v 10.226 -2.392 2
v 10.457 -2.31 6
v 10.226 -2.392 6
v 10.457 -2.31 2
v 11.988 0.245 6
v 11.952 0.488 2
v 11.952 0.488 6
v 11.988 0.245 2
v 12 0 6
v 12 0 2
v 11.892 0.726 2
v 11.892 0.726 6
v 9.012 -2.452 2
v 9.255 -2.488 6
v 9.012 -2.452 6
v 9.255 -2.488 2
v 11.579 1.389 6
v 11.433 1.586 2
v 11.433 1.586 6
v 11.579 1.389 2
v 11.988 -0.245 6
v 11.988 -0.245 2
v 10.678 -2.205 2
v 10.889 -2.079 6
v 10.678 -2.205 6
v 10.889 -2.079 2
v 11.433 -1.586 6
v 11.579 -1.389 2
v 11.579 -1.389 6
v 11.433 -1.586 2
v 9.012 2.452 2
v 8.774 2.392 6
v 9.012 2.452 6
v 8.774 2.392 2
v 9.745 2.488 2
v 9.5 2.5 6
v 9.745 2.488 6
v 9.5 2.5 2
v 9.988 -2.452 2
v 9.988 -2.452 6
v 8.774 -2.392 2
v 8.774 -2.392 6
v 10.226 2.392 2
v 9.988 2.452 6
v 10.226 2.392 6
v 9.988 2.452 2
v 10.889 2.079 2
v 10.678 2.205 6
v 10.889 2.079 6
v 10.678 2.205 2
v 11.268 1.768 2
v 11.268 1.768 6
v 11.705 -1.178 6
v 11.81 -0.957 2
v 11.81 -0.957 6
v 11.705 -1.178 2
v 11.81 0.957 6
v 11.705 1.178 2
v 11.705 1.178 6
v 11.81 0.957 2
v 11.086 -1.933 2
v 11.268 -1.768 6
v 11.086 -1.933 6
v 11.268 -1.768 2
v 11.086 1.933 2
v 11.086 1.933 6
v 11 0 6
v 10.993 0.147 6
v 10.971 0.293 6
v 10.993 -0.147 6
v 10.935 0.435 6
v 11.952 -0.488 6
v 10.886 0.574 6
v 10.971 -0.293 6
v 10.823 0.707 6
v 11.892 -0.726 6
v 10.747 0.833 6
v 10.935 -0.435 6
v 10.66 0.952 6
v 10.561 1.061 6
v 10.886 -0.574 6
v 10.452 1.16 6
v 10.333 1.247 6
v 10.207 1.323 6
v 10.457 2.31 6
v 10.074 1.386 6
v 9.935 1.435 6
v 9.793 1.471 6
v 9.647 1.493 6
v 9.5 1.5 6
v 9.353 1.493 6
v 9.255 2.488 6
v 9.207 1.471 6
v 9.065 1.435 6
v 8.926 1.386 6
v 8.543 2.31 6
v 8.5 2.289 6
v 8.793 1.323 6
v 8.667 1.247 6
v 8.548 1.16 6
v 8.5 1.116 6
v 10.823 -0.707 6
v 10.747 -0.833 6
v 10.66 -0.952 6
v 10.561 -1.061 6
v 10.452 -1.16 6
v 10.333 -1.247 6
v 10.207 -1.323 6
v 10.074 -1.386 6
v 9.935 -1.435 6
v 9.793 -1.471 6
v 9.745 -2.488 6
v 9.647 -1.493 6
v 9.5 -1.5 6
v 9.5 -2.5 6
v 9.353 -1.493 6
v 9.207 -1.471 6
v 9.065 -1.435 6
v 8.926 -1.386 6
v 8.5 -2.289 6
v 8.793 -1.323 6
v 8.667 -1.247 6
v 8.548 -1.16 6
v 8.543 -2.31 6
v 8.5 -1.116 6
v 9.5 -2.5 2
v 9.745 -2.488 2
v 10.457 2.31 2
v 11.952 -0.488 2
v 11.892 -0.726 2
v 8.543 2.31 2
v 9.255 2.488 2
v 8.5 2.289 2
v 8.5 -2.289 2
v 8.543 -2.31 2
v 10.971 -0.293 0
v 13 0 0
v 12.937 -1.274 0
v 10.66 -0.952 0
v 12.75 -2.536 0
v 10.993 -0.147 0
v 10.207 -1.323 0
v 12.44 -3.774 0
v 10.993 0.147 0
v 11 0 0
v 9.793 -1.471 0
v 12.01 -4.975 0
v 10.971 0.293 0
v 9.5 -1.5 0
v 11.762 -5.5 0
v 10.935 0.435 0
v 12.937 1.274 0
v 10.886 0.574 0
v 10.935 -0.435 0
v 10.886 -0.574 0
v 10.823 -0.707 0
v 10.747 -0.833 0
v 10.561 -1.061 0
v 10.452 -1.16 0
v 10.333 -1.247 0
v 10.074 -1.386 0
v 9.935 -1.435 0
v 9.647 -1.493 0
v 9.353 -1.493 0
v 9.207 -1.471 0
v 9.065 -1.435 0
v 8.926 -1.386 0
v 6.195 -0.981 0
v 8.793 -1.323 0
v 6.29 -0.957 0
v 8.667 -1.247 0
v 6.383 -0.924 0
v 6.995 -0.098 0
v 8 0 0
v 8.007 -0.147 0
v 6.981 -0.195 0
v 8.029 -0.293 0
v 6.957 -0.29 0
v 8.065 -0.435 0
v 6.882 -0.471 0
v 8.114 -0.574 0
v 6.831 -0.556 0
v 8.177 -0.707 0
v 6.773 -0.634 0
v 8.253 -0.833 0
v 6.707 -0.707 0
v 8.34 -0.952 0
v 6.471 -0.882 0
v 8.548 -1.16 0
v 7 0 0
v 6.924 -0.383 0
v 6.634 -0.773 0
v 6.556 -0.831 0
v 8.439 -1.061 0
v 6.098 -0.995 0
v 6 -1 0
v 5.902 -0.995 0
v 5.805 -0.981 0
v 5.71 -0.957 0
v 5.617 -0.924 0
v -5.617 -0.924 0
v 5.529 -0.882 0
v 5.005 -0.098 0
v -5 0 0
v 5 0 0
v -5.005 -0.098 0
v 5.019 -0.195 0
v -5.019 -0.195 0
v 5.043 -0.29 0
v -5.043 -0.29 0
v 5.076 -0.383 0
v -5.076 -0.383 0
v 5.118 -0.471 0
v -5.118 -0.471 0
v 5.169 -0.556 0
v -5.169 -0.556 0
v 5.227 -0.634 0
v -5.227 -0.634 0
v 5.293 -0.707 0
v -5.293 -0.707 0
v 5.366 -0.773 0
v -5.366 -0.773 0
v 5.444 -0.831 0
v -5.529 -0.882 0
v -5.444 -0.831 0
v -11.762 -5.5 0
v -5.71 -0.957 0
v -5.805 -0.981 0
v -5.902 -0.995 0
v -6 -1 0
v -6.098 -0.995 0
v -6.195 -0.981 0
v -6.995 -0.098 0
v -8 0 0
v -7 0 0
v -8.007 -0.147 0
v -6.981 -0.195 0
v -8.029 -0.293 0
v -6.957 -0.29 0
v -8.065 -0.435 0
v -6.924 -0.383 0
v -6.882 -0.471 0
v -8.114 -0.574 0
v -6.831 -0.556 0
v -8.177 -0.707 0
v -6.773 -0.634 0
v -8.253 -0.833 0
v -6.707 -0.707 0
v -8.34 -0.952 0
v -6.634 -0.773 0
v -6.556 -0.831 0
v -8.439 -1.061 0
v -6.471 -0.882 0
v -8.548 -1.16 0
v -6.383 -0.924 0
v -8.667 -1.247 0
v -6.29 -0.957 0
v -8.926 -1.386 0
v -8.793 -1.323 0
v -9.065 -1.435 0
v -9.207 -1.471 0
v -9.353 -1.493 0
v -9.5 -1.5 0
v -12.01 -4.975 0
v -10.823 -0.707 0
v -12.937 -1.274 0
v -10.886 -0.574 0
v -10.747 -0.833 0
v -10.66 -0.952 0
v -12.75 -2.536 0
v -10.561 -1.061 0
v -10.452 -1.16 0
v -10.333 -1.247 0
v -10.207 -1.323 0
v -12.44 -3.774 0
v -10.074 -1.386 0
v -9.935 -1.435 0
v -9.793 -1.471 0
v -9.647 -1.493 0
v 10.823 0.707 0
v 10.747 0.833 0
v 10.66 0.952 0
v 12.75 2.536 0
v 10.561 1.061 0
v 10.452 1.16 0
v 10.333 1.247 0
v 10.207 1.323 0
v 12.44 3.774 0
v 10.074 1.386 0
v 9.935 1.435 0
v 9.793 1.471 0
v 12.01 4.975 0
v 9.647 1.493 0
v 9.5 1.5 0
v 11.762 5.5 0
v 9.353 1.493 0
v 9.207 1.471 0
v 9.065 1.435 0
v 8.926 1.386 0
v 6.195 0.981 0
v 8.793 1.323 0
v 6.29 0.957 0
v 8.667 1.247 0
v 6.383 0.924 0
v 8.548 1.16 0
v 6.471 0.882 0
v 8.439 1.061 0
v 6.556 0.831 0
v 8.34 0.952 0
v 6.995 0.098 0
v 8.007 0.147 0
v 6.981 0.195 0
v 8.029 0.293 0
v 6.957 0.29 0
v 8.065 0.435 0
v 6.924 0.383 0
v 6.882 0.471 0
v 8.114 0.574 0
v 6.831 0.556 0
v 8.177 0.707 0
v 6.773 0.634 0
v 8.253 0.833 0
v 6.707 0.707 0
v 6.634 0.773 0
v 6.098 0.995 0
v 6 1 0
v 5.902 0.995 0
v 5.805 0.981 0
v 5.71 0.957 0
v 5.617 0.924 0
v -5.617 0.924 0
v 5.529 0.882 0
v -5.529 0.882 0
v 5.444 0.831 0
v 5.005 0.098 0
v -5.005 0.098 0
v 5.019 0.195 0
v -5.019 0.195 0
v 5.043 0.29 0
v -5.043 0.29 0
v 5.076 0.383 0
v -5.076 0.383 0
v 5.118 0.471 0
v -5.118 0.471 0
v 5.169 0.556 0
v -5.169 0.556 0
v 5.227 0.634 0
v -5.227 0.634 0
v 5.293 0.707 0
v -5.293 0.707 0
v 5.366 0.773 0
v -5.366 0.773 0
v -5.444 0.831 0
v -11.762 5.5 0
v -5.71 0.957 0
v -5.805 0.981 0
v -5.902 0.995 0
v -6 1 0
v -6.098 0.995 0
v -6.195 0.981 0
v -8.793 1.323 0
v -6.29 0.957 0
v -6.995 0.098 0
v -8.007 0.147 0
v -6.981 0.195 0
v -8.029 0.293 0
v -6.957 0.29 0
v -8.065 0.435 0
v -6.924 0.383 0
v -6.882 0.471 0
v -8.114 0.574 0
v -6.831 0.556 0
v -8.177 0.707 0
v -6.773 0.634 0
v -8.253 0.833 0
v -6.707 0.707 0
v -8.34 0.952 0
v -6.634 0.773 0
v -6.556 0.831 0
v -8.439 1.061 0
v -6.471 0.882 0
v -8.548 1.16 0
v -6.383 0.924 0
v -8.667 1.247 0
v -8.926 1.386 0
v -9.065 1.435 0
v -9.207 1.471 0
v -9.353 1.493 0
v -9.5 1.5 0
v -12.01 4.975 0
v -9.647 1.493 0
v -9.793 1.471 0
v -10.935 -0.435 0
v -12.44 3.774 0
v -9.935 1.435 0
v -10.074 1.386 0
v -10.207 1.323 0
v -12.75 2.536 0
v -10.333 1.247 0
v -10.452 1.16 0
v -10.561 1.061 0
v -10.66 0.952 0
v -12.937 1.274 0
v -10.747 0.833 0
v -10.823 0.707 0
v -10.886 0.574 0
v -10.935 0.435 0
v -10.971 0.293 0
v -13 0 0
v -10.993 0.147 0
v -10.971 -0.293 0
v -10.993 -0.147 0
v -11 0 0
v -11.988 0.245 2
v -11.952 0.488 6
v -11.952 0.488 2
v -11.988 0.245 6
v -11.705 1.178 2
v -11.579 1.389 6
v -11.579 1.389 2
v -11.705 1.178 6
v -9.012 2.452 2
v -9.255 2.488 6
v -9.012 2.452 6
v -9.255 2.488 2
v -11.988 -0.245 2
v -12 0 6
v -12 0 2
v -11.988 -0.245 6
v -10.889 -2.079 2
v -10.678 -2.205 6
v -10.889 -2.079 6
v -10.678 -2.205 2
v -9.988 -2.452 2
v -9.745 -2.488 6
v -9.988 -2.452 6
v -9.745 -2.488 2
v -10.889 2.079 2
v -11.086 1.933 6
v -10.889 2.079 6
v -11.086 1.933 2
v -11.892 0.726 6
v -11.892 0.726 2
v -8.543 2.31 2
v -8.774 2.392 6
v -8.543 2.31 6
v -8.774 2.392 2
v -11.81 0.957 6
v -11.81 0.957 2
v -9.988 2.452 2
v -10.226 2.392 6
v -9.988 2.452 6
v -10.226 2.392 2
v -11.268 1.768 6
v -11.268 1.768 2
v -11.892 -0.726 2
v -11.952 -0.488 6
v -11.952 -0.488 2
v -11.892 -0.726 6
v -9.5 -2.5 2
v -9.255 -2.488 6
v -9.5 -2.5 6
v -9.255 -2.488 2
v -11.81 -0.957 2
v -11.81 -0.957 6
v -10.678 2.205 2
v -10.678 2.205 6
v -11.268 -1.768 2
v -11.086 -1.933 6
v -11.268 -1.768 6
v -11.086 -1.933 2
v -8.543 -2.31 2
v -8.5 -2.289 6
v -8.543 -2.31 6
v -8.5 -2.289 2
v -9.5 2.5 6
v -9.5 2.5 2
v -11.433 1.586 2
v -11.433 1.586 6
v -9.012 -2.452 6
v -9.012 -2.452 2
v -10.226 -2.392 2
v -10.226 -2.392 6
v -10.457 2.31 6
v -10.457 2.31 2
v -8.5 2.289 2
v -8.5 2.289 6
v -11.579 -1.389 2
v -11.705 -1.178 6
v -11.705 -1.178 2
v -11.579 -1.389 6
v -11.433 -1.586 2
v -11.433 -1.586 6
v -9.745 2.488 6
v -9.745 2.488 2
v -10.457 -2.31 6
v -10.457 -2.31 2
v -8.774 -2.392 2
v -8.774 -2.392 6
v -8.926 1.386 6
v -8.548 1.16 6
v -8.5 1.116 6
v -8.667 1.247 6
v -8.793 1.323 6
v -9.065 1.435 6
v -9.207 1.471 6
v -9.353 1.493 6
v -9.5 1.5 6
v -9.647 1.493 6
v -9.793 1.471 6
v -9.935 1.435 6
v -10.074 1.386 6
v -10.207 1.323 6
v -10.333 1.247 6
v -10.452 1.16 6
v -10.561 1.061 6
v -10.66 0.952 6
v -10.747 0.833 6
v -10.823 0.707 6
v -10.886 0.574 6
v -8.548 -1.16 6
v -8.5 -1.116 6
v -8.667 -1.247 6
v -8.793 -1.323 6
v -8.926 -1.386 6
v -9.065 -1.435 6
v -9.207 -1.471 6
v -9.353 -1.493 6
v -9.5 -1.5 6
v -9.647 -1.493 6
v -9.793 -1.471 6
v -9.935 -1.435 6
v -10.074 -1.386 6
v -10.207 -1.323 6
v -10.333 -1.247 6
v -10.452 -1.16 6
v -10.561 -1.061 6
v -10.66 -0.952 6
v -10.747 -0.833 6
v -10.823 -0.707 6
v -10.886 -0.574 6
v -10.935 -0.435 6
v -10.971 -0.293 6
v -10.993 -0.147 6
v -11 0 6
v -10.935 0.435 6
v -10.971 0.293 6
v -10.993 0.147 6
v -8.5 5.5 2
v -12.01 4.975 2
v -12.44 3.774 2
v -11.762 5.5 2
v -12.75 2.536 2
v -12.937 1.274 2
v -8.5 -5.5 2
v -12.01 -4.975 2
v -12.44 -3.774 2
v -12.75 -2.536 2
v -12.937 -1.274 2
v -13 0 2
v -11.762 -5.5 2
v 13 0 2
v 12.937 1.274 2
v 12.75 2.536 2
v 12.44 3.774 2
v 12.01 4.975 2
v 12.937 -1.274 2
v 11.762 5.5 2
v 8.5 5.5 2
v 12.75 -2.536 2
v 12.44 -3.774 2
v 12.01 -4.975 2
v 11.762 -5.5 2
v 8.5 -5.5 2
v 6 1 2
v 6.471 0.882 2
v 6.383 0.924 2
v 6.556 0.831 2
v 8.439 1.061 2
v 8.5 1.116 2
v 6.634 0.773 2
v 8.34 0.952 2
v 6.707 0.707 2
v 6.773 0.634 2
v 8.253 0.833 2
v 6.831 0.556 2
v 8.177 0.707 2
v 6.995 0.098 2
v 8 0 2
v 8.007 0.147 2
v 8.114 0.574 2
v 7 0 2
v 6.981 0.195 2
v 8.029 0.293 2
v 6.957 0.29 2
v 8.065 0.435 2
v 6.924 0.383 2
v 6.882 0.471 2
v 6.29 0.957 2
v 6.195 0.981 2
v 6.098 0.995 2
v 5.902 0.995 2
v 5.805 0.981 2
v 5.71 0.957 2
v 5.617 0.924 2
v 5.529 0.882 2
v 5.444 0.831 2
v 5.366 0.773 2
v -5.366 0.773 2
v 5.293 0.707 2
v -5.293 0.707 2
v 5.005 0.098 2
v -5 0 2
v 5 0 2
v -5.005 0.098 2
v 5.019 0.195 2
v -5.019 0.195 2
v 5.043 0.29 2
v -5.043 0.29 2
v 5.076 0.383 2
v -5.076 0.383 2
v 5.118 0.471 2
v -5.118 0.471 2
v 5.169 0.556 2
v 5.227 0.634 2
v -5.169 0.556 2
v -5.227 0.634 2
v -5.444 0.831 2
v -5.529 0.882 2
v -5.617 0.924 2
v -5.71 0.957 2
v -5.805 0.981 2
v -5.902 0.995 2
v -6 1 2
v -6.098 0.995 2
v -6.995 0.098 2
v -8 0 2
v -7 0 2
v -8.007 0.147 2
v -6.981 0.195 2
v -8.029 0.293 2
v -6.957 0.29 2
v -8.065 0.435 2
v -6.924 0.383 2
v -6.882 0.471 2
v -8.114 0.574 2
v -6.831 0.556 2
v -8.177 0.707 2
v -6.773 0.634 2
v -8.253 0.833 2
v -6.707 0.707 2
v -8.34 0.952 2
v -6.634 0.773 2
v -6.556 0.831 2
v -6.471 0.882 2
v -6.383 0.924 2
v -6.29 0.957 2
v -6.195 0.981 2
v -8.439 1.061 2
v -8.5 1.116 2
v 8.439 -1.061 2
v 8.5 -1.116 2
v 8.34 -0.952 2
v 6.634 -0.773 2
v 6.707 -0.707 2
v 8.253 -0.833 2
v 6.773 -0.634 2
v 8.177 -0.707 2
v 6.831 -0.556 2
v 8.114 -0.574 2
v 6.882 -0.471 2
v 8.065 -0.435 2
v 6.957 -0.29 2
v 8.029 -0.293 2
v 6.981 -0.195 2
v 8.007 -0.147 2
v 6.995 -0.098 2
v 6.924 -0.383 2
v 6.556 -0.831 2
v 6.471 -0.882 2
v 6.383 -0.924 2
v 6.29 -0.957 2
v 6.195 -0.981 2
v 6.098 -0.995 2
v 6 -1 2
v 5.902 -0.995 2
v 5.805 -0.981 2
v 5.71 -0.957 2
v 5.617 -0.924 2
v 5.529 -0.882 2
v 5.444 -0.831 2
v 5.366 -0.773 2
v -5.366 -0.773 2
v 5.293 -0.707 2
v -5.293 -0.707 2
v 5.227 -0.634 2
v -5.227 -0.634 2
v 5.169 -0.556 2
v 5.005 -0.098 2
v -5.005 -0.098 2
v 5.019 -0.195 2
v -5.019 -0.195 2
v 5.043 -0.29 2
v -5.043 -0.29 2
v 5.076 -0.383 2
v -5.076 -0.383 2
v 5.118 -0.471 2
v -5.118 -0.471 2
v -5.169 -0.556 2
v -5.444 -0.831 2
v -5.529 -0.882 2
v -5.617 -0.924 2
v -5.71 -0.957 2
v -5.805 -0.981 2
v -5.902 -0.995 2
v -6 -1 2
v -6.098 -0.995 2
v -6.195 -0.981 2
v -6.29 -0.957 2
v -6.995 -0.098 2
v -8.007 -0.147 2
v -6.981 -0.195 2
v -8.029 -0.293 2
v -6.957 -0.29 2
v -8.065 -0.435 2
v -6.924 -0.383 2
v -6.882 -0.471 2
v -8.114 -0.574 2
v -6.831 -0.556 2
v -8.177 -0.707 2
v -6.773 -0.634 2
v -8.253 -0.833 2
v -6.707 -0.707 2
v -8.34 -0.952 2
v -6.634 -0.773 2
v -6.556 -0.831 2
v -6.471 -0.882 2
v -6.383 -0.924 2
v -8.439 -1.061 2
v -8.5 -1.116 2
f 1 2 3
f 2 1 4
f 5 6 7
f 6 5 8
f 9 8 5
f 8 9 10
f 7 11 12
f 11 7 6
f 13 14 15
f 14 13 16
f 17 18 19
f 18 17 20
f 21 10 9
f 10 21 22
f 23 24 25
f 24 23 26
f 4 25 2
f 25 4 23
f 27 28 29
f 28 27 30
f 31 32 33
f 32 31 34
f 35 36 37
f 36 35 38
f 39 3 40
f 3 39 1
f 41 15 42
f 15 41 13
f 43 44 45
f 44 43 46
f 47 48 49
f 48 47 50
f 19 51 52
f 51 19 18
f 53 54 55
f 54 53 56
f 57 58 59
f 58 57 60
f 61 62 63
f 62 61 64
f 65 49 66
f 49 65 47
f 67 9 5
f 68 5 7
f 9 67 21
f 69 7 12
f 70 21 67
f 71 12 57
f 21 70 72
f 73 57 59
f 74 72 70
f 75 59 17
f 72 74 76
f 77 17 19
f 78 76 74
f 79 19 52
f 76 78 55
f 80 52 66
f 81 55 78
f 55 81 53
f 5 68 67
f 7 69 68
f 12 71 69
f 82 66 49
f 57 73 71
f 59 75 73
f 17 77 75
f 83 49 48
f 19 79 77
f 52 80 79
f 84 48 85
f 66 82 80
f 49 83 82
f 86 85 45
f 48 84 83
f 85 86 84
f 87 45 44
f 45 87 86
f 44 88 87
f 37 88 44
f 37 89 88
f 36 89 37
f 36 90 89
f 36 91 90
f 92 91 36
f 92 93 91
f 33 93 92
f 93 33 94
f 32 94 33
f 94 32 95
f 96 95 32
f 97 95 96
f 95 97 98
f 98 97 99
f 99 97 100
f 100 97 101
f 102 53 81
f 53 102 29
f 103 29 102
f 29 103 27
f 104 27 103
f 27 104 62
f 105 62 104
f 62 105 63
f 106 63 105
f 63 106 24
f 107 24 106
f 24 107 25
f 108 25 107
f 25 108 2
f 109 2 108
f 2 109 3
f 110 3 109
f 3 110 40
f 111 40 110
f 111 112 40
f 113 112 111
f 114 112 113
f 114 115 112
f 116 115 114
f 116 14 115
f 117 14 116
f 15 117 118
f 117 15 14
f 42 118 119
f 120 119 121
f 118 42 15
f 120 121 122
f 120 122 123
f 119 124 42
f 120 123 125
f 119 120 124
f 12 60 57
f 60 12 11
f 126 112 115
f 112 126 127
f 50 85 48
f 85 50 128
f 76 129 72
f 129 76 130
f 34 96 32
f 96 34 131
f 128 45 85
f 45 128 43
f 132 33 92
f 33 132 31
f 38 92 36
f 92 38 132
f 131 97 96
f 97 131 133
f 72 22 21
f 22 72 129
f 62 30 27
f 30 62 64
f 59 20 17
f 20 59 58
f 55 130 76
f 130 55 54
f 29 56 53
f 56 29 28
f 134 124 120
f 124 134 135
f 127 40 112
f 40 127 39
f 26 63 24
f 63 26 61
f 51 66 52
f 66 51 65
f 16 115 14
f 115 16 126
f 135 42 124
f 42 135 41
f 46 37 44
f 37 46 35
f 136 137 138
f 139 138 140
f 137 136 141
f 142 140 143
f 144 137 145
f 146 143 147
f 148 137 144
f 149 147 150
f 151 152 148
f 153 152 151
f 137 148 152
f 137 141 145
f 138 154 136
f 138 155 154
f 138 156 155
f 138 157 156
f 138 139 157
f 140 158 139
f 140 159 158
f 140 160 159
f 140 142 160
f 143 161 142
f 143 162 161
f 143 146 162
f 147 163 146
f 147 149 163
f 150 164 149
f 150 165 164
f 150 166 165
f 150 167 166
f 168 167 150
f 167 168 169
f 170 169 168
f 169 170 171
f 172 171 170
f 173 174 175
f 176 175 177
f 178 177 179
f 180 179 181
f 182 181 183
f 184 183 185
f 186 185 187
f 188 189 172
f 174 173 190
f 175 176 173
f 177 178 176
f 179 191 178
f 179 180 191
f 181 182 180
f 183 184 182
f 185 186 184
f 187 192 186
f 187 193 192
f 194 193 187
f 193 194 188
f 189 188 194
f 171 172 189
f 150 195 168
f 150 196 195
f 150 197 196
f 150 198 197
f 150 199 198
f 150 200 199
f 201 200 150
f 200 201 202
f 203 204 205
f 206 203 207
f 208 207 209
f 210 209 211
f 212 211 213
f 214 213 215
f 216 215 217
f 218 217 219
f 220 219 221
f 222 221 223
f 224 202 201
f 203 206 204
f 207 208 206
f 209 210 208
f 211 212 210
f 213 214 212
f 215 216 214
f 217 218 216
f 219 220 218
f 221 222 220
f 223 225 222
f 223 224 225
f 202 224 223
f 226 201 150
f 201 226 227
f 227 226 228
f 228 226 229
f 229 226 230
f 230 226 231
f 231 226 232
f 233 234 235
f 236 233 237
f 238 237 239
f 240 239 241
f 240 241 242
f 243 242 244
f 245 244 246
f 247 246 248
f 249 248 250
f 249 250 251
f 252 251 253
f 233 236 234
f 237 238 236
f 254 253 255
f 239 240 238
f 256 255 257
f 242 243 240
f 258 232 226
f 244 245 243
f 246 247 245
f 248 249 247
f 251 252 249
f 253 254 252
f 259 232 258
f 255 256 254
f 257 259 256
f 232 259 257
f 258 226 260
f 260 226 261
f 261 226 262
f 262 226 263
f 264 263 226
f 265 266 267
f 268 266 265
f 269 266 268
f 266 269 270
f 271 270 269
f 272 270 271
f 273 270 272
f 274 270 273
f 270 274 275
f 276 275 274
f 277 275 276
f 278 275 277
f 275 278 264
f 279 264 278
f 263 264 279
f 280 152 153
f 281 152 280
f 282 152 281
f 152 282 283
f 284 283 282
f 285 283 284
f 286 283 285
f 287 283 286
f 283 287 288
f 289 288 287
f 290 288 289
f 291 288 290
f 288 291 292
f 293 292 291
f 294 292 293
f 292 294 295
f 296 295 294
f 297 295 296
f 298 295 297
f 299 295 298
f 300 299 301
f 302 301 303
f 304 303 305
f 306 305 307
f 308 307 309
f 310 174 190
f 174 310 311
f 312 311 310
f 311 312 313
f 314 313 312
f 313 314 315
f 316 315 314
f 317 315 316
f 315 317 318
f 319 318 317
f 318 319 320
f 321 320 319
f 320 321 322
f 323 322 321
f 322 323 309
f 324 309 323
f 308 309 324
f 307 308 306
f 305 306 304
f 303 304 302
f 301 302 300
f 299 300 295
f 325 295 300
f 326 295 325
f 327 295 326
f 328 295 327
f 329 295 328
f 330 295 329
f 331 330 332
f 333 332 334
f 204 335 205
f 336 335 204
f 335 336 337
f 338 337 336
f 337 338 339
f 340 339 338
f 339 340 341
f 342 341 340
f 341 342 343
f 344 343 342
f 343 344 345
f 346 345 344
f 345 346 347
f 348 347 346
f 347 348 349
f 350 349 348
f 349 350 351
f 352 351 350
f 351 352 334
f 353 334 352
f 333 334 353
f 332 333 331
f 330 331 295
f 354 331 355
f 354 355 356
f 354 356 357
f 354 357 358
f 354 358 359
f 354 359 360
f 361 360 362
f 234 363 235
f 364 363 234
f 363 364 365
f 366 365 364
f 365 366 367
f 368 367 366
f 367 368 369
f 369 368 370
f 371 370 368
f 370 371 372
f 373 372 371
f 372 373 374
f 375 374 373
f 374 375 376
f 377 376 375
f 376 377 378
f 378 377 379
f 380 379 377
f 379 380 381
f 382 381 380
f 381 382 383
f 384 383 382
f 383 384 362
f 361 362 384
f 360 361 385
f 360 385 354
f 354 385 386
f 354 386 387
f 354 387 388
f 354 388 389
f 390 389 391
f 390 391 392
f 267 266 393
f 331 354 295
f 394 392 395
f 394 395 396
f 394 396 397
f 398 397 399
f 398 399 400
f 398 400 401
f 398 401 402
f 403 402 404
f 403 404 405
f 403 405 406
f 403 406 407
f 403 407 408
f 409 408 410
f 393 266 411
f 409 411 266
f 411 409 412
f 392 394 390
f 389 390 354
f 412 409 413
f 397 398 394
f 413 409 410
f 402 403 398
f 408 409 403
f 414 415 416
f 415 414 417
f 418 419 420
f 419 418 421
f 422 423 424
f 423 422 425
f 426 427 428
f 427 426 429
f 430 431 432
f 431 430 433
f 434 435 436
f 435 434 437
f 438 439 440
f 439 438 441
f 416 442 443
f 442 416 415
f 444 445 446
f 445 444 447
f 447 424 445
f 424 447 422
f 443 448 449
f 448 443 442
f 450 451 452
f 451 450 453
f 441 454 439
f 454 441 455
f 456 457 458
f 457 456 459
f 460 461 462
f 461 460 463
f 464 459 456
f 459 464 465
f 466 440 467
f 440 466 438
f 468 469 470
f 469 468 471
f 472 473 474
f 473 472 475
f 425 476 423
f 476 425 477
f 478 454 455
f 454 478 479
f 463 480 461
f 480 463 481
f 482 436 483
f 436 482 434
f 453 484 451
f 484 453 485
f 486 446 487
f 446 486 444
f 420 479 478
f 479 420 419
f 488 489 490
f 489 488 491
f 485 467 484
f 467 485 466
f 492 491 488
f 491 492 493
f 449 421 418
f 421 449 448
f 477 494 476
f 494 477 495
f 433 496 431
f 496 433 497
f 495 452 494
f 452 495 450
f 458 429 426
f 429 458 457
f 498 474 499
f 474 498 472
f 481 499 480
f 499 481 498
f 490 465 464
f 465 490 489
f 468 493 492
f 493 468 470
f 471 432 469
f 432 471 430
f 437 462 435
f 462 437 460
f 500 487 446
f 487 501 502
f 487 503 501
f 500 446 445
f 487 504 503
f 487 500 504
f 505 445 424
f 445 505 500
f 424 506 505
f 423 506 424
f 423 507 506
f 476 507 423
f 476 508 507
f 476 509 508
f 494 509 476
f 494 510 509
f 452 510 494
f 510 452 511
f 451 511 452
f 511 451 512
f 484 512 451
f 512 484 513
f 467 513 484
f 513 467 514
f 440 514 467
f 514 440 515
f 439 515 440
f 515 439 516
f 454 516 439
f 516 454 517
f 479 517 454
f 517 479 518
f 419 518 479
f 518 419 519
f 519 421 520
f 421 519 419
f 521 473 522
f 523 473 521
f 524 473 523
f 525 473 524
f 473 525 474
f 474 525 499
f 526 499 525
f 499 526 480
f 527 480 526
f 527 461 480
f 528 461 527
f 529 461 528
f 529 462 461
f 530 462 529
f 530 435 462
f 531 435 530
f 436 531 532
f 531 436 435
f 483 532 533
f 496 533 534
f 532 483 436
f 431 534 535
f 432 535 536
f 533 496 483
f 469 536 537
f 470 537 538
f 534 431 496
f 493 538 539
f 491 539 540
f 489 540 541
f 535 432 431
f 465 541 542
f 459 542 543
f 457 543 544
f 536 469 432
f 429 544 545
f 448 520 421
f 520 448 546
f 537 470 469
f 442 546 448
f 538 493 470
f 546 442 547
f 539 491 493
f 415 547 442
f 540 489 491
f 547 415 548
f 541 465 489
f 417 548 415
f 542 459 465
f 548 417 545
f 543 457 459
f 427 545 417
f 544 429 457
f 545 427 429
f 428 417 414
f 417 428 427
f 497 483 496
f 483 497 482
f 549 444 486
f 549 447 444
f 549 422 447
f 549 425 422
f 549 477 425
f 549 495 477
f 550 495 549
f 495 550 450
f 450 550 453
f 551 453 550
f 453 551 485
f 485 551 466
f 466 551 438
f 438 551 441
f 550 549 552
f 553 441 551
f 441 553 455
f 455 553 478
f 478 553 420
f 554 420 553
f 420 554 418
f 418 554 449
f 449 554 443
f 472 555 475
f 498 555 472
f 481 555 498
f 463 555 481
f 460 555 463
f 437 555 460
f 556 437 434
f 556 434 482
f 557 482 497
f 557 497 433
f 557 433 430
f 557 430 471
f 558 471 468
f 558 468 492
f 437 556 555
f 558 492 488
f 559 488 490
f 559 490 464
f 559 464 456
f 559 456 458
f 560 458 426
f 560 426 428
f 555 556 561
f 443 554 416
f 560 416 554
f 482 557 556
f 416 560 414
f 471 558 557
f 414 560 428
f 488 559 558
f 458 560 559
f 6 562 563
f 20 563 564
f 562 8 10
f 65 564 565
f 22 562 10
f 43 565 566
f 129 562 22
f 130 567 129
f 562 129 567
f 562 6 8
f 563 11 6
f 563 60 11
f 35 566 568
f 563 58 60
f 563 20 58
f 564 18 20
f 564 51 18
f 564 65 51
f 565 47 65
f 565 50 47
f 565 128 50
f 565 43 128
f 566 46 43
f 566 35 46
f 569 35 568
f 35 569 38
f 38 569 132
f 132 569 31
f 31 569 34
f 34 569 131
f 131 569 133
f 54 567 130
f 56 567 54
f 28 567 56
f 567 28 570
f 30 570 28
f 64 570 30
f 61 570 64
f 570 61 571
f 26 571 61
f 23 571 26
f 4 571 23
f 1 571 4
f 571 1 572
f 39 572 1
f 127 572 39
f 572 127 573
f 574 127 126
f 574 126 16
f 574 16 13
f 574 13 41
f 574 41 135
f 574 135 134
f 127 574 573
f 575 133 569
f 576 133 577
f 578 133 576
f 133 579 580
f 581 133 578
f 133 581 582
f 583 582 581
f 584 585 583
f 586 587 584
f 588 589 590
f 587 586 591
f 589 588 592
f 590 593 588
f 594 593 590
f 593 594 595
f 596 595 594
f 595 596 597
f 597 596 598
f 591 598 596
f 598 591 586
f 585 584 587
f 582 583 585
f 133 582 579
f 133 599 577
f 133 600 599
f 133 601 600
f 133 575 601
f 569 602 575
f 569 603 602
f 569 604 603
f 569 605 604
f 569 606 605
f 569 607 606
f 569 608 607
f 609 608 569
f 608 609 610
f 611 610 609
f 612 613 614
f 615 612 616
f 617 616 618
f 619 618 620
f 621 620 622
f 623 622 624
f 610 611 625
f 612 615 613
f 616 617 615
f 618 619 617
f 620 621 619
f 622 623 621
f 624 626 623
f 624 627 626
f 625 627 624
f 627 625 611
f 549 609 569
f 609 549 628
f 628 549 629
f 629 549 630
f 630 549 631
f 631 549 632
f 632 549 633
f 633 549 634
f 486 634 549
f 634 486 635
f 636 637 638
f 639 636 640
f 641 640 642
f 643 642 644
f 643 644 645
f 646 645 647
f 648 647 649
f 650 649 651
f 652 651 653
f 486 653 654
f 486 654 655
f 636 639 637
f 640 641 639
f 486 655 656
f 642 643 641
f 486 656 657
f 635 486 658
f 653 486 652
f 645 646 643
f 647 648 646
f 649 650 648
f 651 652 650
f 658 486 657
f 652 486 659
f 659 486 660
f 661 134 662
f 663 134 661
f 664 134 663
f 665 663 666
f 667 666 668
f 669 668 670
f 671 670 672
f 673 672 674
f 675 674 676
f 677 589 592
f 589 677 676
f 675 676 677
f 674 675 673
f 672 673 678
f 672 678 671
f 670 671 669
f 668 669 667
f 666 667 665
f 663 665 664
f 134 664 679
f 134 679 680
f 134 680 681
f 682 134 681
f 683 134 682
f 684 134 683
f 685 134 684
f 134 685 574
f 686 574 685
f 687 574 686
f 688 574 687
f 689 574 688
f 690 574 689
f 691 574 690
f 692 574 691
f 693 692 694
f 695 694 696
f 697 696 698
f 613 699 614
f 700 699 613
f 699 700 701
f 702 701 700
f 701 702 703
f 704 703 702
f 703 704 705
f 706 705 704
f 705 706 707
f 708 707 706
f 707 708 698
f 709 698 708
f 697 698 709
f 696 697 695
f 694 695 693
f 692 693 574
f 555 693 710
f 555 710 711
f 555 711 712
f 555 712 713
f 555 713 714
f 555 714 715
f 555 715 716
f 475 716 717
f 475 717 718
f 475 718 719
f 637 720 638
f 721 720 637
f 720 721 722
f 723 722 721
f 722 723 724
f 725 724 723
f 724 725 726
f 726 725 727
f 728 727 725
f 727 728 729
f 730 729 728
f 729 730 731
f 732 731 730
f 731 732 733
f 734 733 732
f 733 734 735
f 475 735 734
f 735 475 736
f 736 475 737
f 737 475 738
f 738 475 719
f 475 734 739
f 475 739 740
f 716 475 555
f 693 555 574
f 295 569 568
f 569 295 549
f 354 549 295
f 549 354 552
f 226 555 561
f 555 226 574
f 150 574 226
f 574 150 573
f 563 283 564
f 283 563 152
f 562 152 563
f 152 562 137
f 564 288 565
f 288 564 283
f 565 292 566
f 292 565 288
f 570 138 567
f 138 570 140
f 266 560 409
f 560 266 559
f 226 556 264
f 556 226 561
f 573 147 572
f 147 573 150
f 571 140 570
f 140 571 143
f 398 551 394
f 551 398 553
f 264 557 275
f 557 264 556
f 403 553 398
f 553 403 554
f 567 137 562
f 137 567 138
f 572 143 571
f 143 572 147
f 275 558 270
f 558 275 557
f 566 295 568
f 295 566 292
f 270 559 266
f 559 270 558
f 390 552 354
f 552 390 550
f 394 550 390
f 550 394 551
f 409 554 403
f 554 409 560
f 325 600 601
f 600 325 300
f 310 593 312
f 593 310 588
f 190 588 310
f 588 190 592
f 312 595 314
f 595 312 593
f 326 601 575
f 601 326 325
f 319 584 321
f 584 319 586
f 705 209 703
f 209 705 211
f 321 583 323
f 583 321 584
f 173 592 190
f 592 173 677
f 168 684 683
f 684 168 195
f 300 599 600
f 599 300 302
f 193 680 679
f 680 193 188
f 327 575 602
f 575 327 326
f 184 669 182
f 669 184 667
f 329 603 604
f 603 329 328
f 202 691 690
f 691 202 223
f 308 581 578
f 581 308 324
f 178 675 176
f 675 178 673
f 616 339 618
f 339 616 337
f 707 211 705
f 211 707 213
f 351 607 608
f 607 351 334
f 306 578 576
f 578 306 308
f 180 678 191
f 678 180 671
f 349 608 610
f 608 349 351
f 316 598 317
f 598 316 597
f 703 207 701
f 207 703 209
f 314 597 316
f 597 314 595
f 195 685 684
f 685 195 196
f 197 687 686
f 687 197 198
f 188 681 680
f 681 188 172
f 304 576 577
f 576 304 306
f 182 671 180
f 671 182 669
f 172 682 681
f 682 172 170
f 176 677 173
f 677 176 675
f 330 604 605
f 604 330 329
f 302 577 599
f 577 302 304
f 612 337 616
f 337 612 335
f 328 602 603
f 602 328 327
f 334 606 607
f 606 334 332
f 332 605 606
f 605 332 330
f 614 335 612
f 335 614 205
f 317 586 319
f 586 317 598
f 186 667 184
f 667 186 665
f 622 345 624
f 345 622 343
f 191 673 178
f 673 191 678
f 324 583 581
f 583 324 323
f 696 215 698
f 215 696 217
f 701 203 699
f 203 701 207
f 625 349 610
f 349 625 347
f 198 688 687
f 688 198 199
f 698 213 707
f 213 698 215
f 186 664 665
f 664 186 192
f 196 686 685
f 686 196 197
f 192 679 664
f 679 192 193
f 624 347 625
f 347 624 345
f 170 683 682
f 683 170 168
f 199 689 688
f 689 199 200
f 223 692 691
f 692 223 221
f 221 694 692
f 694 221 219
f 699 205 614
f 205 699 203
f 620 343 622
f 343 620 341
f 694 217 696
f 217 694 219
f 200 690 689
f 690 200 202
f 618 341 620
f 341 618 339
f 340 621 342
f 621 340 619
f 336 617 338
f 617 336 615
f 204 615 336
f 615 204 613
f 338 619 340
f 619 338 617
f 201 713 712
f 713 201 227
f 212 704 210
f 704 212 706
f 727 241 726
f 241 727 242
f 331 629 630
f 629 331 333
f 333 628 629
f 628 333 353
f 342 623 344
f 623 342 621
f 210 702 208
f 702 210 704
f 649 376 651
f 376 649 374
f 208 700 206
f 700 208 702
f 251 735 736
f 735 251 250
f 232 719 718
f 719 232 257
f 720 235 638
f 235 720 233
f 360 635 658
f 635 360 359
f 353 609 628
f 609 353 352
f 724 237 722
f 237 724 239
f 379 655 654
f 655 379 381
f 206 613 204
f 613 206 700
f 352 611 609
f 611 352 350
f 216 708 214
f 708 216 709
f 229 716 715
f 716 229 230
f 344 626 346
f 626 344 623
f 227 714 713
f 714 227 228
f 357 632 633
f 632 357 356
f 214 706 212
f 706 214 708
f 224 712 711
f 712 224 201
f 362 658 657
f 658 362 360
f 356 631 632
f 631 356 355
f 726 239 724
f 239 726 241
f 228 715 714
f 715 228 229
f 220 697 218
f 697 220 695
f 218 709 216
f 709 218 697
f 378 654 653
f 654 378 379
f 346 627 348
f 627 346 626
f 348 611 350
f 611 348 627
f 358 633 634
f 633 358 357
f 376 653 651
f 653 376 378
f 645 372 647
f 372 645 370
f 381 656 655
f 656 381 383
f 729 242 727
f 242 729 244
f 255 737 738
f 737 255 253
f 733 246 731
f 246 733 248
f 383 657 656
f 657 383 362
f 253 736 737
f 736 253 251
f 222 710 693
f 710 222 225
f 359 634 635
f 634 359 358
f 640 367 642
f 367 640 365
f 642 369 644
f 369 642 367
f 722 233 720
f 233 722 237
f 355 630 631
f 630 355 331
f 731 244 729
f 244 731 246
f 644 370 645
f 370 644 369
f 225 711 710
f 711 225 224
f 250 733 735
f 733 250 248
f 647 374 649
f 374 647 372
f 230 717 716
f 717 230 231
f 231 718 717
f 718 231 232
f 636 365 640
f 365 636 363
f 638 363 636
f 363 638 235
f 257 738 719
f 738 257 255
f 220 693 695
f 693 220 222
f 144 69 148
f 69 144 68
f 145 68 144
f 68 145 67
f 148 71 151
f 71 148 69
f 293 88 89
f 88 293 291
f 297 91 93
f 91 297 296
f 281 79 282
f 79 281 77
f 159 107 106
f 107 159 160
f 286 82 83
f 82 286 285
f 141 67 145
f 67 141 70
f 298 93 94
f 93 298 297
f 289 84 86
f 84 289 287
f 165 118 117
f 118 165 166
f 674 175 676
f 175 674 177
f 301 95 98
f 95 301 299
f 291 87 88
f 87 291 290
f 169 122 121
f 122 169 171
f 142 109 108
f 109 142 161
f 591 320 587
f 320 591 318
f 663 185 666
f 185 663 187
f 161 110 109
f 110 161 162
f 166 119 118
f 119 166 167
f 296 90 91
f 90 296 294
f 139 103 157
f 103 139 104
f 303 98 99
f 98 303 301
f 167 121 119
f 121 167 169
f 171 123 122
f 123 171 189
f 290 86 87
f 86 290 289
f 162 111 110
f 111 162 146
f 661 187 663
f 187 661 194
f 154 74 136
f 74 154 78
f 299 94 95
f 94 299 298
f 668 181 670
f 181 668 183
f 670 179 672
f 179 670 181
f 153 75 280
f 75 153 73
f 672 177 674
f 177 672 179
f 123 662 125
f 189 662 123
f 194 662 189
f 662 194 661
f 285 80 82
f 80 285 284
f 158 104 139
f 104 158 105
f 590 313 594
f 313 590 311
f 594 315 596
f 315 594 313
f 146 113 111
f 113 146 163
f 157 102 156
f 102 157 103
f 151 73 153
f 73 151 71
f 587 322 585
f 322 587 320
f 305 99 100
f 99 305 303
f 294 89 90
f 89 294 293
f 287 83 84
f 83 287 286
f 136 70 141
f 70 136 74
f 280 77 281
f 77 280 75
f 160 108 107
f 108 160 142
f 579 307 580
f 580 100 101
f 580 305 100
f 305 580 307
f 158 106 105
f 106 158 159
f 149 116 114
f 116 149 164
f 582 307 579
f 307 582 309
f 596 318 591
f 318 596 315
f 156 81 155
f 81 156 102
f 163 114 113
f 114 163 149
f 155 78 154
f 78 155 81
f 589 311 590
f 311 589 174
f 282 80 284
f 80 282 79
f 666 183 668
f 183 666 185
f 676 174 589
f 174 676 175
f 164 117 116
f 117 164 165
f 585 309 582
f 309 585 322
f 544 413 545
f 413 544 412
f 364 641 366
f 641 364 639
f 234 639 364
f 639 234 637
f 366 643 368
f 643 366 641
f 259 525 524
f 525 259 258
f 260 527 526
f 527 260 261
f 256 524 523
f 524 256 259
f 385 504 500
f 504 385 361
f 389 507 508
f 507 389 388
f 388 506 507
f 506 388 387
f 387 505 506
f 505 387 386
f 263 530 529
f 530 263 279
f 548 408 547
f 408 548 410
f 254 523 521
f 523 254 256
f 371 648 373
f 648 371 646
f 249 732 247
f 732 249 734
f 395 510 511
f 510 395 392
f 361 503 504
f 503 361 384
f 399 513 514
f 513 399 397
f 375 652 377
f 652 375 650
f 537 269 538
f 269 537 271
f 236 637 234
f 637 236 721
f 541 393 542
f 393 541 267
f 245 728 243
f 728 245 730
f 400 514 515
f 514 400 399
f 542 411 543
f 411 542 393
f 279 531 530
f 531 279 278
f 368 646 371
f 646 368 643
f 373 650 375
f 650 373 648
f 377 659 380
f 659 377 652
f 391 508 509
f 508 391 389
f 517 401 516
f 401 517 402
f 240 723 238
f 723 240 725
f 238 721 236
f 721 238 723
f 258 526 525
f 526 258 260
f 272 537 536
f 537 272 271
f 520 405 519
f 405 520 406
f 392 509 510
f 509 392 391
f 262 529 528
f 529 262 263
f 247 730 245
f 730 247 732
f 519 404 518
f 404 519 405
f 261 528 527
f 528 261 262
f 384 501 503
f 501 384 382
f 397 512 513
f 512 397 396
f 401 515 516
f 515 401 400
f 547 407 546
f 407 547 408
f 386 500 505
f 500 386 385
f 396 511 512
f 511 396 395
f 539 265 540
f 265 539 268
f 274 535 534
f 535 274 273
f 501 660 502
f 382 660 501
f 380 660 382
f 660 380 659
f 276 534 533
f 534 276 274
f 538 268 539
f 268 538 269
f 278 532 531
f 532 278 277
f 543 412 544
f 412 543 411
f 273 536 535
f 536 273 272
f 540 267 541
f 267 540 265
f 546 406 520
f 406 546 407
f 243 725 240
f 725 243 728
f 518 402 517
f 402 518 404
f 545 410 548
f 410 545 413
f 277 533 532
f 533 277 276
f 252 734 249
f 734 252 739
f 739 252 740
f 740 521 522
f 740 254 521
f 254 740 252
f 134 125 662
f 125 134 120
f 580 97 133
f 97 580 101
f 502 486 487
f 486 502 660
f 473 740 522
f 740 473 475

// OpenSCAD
$fn = 64;

MAGNET_H = 3;
SENSOR_H = 2;
MAGNET_SENSOR_H = MAGNET_H + SENSOR_H;

MAGNET_D_OUT = 10;
MAGNET_D_IN = 7;

MOTOR_D_OUT = 35;
MOTOR_D_IN = 5;
MOTOR_SHAFT_D = 4;


MOTOR_H = 15;

MOTOR_FIX_HOLE_D = 3;

MOTOR_BASE_HOLE_D = 12;

MOTOR_BASE_D1 = 16;
MOTOR_BASE_D2 = 19;

MOTOR_TOP_D1 = 16;
MOTOR_TOP_D2 = 16;

MOTOR_TOP_H = 10;

DRIVER_SIDE = 20;
DRIVER_CORNER_HOLE_D = 2;

DRIVER_PILLAR_D = 5;
DRIVER_PILLAR_FIX_H = 2;
DRIVER_INNER_FIX_L = 8;
DRIVER_INNER_FIX_W = 1;

BASE_H = 3;

BASE_W = 20;
BASE_L = 50;

BASE_FOOT_W = 50;
BASE_FOOT_L = 20;
BASE_FOOT_HOLE_W = 40;
BASE_FOOT_HOLE_WL = 10;
BASE_FOOT_HOLE_D = 2;
BASE_FOOT_HOLE_HEAD_D = 4;

BASE_LEG_W = 8;
BASE_LEG_L = 50;

module driver_pillar() {
    translate([0, 0, MAGNET_SENSOR_H/2])
    union() {
        difference() {
            translate([0, 0, DRIVER_PILLAR_FIX_H/2]) cylinder(r=DRIVER_PILLAR_D/2, h=MAGNET_SENSOR_H + DRIVER_PILLAR_FIX_H, center=true);
            translate([DRIVER_PILLAR_D/2, DRIVER_PILLAR_D/2, 0]) cube([DRIVER_PILLAR_D, DRIVER_PILLAR_D, MAGNET_SENSOR_H*2], center=true);
        }
        translate([0, 0, -MAGNET_SENSOR_H/4]) cylinder(r=DRIVER_PILLAR_D/2, h=MAGNET_SENSOR_H/2, center=true);
        rotate([0, 0, 45]) cube([DRIVER_INNER_FIX_L, DRIVER_INNER_FIX_W, MAGNET_SENSOR_H], center=true);
    }

}

module driver_pillar_hole() {
    translate([0, 0, MAGNET_SENSOR_H/2])
    cylinder(r=DRIVER_CORNER_HOLE_D/2, h=MAGNET_SENSOR_H*2, center=true);    
}

module driver_corner_fix() {
    difference() {
        driver_pillar();
        driver_pillar_hole();
    }
}

module driver_corners() {
    translate([+DRIVER_SIDE/2, +DRIVER_SIDE/2, 0]) rotate([0, 0, 180]) driver_corner_fix();
    translate([+DRIVER_SIDE/2, -DRIVER_SIDE/2, 0]) rotate([0, 0, 90]) driver_corner_fix();
    translate([-DRIVER_SIDE/2, +DRIVER_SIDE/2, 0]) rotate([0, 0, -90]) driver_corner_fix();
    translate([-DRIVER_SIDE/2, -DRIVER_SIDE/2, 0]) rotate([0, 0, 0]) driver_corner_fix();
}

AS5048A_BASE_W = 26;
AS5048A_BASE_L = 11;
AS5048A_BASE_H = 2;
AS5048A_H = 2.5;
MAGNET_H = 4;

AS5048A_HOLE_D = 2;
AS5048A_SUPP_D = MOTOR_FIX_HOLE_D + 2;
AS5048A_SUPP_H = AS5048A_H + MAGNET_H + AS5048A_BASE_H + 0.5 - BASE_H;
AS5048A_SUPP_W = 12;

AS5048A_CLEAR_W = AS5048A_SUPP_W + 5;

module as5048a_support_holes() {
    union() {
        translate([+AS5048A_SUPP_W/2, 0, 0]) cylinder(r=AS5048A_HOLE_D/2, h=50, center=true);
        translate([-AS5048A_SUPP_W/2, 0, 0]) cylinder(r=AS5048A_HOLE_D/2, h=50, center=true);
        translate([+MOTOR_BASE_D2/2, 0, 0]) cylinder(r=MOTOR_FIX_HOLE_D/2, h=50, center=true);
        translate([-MOTOR_BASE_D2/2, 0, 0]) cylinder(r=MOTOR_FIX_HOLE_D/2, h=50, center=true);
    }
}

module as5048a_support_pillars() {
    union() {
        translate([+MOTOR_BASE_D2/2, 0, AS5048A_SUPP_H/2]) cylinder(r=AS5048A_SUPP_D/2, h=AS5048A_SUPP_H, center=true);
        translate([-MOTOR_BASE_D2/2, 0, AS5048A_SUPP_H/2]) cylinder(r=AS5048A_SUPP_D/2, h=AS5048A_SUPP_H, center=true);
    }
}

module as5048a_support() {
    difference() {
        union() {
            as5048a_support_pillars();
            translate([0, 0, AS5048A_BASE_H/2]) {
                intersection() {
                    cube([AS5048A_BASE_W, AS5048A_BASE_L, AS5048A_BASE_H], center=true);
                    cylinder(r=AS5048A_BASE_W/2, h=AS5048A_BASE_H, center=true);
                }
            }
        }
        union() {
            as5048a_support_holes();
            translate([0, 0, AS5048A_BASE_H + 25]) {
                cube([AS5048A_CLEAR_W, AS5048A_CLEAR_W, 50], center=true);
            }
        }
    }
}

module base_plate() {
    difference() {
        union() {
            translate([0, 0, BASE_H/2]) {
                cylinder(r=MOTOR_D_OUT/2, h=BASE_H, center=true);
                cube([BASE_W, BASE_L, BASE_H], center=true);
            }
        }
        union() {
            cylinder(r=MOTOR_BASE_HOLE_D/2, h=50, center=true);
            translate([+MOTOR_BASE_D2/2, 0, 0]) cylinder(r=MOTOR_FIX_HOLE_D/2, h=50, center=true);
            translate([-MOTOR_BASE_D2/2, 0, 0]) cylinder(r=MOTOR_FIX_HOLE_D/2, h=50, center=true);
            translate([0, +MOTOR_BASE_D1/2, 0]) cylinder(r=MOTOR_FIX_HOLE_D/2, h=50, center=true);
            translate([0, -MOTOR_BASE_D1/2, 0]) cylinder(r=MOTOR_FIX_HOLE_D/2, h=50, center=true);
        }
    }
}

module base_foot() {
    translate([0, -(BASE_L + BASE_H) / 2, BASE_FOOT_L/2])
    rotate([-90, 0, 0])
    difference() {
        union() {
            cube([BASE_FOOT_W, BASE_FOOT_L, BASE_H], center=true);
            translate([-(BASE_H - BASE_W) / 2, (BASE_FOOT_L / 4) - BASE_H, (BASE_H / 2) + (BASE_FOOT_L / 4)]) cube([BASE_H, BASE_FOOT_L / 2, BASE_FOOT_L / 2], center=true);
            translate([+(BASE_H - BASE_W) / 2, (BASE_FOOT_L / 4) - BASE_H, (BASE_H / 2) + (BASE_FOOT_L / 4)]) cube([BASE_H, BASE_FOOT_L / 2, BASE_FOOT_L / 2], center=true);
        }
        union() {
            translate([+BASE_FOOT_HOLE_W/2, +BASE_FOOT_HOLE_WL/2, 0]) cylinder(r=BASE_FOOT_HOLE_D/2, h=50, center=true);
            translate([-BASE_FOOT_HOLE_W/2, +BASE_FOOT_HOLE_WL/2, 0]) cylinder(r=BASE_FOOT_HOLE_D/2, h=50, center=true);
            translate([+BASE_FOOT_HOLE_W/2, -BASE_FOOT_HOLE_WL/2, 0]) cylinder(r=BASE_FOOT_HOLE_D/2, h=50, center=true);
            translate([-BASE_FOOT_HOLE_W/2, -BASE_FOOT_HOLE_WL/2, 0]) cylinder(r=BASE_FOOT_HOLE_D/2, h=50, center=true);
            translate([0, -BASE_H, (BASE_H + BASE_FOOT_L) / 2]) rotate([0, 90, 0]) cylinder(r=BASE_FOOT_L/2, h=50, center=true);
        }
    }
}

module base_mosquito() {
    driver_corners();
    base_plate();
    base_foot();
}

module base_as5048a() {
    base_plate();
    base_foot();
}

module base_leg() {
    difference() {
        union() {
            cube([BASE_LEG_W, BASE_LEG_L, BASE_H], center=true);
        }
        translate([0, -10, 0])
        union() {
            translate([0, +BASE_FOOT_HOLE_WL/2, 0]) cylinder(r=BASE_FOOT_HOLE_D/2, h=50, center=true);
            translate([0, -BASE_FOOT_HOLE_WL/2, 0]) cylinder(r=BASE_FOOT_HOLE_D/2, h=50, center=true);
            translate([0, +BASE_FOOT_HOLE_WL/2, 25]) cylinder(r=BASE_FOOT_HOLE_HEAD_D/2, h=50, center=true);
            translate([0, -BASE_FOOT_HOLE_WL/2, 25]) cylinder(r=BASE_FOOT_HOLE_HEAD_D/2, h=50, center=true);
        }
    }
}


module shaft_fix() {
    difference() {
        union() {
            translate([0, 0, MAGNET_H/2]) cylinder(r=MAGNET_D_IN/2, h=MAGNET_H, center=true);
            translate([0, 0, (MOTOR_H/2) + MAGNET_H]) cylinder(r=MOTOR_D_IN/2, h=MOTOR_H, center=true);
        }
        cylinder(r=MOTOR_SHAFT_D/2, h=50, center=true);
    }
}

as5048a_support();
//base_as5048a();

//translate([35, 0, 0]) base_leg();
//translate([-35, 0, 0]) base_leg();
//shaft_fix();
